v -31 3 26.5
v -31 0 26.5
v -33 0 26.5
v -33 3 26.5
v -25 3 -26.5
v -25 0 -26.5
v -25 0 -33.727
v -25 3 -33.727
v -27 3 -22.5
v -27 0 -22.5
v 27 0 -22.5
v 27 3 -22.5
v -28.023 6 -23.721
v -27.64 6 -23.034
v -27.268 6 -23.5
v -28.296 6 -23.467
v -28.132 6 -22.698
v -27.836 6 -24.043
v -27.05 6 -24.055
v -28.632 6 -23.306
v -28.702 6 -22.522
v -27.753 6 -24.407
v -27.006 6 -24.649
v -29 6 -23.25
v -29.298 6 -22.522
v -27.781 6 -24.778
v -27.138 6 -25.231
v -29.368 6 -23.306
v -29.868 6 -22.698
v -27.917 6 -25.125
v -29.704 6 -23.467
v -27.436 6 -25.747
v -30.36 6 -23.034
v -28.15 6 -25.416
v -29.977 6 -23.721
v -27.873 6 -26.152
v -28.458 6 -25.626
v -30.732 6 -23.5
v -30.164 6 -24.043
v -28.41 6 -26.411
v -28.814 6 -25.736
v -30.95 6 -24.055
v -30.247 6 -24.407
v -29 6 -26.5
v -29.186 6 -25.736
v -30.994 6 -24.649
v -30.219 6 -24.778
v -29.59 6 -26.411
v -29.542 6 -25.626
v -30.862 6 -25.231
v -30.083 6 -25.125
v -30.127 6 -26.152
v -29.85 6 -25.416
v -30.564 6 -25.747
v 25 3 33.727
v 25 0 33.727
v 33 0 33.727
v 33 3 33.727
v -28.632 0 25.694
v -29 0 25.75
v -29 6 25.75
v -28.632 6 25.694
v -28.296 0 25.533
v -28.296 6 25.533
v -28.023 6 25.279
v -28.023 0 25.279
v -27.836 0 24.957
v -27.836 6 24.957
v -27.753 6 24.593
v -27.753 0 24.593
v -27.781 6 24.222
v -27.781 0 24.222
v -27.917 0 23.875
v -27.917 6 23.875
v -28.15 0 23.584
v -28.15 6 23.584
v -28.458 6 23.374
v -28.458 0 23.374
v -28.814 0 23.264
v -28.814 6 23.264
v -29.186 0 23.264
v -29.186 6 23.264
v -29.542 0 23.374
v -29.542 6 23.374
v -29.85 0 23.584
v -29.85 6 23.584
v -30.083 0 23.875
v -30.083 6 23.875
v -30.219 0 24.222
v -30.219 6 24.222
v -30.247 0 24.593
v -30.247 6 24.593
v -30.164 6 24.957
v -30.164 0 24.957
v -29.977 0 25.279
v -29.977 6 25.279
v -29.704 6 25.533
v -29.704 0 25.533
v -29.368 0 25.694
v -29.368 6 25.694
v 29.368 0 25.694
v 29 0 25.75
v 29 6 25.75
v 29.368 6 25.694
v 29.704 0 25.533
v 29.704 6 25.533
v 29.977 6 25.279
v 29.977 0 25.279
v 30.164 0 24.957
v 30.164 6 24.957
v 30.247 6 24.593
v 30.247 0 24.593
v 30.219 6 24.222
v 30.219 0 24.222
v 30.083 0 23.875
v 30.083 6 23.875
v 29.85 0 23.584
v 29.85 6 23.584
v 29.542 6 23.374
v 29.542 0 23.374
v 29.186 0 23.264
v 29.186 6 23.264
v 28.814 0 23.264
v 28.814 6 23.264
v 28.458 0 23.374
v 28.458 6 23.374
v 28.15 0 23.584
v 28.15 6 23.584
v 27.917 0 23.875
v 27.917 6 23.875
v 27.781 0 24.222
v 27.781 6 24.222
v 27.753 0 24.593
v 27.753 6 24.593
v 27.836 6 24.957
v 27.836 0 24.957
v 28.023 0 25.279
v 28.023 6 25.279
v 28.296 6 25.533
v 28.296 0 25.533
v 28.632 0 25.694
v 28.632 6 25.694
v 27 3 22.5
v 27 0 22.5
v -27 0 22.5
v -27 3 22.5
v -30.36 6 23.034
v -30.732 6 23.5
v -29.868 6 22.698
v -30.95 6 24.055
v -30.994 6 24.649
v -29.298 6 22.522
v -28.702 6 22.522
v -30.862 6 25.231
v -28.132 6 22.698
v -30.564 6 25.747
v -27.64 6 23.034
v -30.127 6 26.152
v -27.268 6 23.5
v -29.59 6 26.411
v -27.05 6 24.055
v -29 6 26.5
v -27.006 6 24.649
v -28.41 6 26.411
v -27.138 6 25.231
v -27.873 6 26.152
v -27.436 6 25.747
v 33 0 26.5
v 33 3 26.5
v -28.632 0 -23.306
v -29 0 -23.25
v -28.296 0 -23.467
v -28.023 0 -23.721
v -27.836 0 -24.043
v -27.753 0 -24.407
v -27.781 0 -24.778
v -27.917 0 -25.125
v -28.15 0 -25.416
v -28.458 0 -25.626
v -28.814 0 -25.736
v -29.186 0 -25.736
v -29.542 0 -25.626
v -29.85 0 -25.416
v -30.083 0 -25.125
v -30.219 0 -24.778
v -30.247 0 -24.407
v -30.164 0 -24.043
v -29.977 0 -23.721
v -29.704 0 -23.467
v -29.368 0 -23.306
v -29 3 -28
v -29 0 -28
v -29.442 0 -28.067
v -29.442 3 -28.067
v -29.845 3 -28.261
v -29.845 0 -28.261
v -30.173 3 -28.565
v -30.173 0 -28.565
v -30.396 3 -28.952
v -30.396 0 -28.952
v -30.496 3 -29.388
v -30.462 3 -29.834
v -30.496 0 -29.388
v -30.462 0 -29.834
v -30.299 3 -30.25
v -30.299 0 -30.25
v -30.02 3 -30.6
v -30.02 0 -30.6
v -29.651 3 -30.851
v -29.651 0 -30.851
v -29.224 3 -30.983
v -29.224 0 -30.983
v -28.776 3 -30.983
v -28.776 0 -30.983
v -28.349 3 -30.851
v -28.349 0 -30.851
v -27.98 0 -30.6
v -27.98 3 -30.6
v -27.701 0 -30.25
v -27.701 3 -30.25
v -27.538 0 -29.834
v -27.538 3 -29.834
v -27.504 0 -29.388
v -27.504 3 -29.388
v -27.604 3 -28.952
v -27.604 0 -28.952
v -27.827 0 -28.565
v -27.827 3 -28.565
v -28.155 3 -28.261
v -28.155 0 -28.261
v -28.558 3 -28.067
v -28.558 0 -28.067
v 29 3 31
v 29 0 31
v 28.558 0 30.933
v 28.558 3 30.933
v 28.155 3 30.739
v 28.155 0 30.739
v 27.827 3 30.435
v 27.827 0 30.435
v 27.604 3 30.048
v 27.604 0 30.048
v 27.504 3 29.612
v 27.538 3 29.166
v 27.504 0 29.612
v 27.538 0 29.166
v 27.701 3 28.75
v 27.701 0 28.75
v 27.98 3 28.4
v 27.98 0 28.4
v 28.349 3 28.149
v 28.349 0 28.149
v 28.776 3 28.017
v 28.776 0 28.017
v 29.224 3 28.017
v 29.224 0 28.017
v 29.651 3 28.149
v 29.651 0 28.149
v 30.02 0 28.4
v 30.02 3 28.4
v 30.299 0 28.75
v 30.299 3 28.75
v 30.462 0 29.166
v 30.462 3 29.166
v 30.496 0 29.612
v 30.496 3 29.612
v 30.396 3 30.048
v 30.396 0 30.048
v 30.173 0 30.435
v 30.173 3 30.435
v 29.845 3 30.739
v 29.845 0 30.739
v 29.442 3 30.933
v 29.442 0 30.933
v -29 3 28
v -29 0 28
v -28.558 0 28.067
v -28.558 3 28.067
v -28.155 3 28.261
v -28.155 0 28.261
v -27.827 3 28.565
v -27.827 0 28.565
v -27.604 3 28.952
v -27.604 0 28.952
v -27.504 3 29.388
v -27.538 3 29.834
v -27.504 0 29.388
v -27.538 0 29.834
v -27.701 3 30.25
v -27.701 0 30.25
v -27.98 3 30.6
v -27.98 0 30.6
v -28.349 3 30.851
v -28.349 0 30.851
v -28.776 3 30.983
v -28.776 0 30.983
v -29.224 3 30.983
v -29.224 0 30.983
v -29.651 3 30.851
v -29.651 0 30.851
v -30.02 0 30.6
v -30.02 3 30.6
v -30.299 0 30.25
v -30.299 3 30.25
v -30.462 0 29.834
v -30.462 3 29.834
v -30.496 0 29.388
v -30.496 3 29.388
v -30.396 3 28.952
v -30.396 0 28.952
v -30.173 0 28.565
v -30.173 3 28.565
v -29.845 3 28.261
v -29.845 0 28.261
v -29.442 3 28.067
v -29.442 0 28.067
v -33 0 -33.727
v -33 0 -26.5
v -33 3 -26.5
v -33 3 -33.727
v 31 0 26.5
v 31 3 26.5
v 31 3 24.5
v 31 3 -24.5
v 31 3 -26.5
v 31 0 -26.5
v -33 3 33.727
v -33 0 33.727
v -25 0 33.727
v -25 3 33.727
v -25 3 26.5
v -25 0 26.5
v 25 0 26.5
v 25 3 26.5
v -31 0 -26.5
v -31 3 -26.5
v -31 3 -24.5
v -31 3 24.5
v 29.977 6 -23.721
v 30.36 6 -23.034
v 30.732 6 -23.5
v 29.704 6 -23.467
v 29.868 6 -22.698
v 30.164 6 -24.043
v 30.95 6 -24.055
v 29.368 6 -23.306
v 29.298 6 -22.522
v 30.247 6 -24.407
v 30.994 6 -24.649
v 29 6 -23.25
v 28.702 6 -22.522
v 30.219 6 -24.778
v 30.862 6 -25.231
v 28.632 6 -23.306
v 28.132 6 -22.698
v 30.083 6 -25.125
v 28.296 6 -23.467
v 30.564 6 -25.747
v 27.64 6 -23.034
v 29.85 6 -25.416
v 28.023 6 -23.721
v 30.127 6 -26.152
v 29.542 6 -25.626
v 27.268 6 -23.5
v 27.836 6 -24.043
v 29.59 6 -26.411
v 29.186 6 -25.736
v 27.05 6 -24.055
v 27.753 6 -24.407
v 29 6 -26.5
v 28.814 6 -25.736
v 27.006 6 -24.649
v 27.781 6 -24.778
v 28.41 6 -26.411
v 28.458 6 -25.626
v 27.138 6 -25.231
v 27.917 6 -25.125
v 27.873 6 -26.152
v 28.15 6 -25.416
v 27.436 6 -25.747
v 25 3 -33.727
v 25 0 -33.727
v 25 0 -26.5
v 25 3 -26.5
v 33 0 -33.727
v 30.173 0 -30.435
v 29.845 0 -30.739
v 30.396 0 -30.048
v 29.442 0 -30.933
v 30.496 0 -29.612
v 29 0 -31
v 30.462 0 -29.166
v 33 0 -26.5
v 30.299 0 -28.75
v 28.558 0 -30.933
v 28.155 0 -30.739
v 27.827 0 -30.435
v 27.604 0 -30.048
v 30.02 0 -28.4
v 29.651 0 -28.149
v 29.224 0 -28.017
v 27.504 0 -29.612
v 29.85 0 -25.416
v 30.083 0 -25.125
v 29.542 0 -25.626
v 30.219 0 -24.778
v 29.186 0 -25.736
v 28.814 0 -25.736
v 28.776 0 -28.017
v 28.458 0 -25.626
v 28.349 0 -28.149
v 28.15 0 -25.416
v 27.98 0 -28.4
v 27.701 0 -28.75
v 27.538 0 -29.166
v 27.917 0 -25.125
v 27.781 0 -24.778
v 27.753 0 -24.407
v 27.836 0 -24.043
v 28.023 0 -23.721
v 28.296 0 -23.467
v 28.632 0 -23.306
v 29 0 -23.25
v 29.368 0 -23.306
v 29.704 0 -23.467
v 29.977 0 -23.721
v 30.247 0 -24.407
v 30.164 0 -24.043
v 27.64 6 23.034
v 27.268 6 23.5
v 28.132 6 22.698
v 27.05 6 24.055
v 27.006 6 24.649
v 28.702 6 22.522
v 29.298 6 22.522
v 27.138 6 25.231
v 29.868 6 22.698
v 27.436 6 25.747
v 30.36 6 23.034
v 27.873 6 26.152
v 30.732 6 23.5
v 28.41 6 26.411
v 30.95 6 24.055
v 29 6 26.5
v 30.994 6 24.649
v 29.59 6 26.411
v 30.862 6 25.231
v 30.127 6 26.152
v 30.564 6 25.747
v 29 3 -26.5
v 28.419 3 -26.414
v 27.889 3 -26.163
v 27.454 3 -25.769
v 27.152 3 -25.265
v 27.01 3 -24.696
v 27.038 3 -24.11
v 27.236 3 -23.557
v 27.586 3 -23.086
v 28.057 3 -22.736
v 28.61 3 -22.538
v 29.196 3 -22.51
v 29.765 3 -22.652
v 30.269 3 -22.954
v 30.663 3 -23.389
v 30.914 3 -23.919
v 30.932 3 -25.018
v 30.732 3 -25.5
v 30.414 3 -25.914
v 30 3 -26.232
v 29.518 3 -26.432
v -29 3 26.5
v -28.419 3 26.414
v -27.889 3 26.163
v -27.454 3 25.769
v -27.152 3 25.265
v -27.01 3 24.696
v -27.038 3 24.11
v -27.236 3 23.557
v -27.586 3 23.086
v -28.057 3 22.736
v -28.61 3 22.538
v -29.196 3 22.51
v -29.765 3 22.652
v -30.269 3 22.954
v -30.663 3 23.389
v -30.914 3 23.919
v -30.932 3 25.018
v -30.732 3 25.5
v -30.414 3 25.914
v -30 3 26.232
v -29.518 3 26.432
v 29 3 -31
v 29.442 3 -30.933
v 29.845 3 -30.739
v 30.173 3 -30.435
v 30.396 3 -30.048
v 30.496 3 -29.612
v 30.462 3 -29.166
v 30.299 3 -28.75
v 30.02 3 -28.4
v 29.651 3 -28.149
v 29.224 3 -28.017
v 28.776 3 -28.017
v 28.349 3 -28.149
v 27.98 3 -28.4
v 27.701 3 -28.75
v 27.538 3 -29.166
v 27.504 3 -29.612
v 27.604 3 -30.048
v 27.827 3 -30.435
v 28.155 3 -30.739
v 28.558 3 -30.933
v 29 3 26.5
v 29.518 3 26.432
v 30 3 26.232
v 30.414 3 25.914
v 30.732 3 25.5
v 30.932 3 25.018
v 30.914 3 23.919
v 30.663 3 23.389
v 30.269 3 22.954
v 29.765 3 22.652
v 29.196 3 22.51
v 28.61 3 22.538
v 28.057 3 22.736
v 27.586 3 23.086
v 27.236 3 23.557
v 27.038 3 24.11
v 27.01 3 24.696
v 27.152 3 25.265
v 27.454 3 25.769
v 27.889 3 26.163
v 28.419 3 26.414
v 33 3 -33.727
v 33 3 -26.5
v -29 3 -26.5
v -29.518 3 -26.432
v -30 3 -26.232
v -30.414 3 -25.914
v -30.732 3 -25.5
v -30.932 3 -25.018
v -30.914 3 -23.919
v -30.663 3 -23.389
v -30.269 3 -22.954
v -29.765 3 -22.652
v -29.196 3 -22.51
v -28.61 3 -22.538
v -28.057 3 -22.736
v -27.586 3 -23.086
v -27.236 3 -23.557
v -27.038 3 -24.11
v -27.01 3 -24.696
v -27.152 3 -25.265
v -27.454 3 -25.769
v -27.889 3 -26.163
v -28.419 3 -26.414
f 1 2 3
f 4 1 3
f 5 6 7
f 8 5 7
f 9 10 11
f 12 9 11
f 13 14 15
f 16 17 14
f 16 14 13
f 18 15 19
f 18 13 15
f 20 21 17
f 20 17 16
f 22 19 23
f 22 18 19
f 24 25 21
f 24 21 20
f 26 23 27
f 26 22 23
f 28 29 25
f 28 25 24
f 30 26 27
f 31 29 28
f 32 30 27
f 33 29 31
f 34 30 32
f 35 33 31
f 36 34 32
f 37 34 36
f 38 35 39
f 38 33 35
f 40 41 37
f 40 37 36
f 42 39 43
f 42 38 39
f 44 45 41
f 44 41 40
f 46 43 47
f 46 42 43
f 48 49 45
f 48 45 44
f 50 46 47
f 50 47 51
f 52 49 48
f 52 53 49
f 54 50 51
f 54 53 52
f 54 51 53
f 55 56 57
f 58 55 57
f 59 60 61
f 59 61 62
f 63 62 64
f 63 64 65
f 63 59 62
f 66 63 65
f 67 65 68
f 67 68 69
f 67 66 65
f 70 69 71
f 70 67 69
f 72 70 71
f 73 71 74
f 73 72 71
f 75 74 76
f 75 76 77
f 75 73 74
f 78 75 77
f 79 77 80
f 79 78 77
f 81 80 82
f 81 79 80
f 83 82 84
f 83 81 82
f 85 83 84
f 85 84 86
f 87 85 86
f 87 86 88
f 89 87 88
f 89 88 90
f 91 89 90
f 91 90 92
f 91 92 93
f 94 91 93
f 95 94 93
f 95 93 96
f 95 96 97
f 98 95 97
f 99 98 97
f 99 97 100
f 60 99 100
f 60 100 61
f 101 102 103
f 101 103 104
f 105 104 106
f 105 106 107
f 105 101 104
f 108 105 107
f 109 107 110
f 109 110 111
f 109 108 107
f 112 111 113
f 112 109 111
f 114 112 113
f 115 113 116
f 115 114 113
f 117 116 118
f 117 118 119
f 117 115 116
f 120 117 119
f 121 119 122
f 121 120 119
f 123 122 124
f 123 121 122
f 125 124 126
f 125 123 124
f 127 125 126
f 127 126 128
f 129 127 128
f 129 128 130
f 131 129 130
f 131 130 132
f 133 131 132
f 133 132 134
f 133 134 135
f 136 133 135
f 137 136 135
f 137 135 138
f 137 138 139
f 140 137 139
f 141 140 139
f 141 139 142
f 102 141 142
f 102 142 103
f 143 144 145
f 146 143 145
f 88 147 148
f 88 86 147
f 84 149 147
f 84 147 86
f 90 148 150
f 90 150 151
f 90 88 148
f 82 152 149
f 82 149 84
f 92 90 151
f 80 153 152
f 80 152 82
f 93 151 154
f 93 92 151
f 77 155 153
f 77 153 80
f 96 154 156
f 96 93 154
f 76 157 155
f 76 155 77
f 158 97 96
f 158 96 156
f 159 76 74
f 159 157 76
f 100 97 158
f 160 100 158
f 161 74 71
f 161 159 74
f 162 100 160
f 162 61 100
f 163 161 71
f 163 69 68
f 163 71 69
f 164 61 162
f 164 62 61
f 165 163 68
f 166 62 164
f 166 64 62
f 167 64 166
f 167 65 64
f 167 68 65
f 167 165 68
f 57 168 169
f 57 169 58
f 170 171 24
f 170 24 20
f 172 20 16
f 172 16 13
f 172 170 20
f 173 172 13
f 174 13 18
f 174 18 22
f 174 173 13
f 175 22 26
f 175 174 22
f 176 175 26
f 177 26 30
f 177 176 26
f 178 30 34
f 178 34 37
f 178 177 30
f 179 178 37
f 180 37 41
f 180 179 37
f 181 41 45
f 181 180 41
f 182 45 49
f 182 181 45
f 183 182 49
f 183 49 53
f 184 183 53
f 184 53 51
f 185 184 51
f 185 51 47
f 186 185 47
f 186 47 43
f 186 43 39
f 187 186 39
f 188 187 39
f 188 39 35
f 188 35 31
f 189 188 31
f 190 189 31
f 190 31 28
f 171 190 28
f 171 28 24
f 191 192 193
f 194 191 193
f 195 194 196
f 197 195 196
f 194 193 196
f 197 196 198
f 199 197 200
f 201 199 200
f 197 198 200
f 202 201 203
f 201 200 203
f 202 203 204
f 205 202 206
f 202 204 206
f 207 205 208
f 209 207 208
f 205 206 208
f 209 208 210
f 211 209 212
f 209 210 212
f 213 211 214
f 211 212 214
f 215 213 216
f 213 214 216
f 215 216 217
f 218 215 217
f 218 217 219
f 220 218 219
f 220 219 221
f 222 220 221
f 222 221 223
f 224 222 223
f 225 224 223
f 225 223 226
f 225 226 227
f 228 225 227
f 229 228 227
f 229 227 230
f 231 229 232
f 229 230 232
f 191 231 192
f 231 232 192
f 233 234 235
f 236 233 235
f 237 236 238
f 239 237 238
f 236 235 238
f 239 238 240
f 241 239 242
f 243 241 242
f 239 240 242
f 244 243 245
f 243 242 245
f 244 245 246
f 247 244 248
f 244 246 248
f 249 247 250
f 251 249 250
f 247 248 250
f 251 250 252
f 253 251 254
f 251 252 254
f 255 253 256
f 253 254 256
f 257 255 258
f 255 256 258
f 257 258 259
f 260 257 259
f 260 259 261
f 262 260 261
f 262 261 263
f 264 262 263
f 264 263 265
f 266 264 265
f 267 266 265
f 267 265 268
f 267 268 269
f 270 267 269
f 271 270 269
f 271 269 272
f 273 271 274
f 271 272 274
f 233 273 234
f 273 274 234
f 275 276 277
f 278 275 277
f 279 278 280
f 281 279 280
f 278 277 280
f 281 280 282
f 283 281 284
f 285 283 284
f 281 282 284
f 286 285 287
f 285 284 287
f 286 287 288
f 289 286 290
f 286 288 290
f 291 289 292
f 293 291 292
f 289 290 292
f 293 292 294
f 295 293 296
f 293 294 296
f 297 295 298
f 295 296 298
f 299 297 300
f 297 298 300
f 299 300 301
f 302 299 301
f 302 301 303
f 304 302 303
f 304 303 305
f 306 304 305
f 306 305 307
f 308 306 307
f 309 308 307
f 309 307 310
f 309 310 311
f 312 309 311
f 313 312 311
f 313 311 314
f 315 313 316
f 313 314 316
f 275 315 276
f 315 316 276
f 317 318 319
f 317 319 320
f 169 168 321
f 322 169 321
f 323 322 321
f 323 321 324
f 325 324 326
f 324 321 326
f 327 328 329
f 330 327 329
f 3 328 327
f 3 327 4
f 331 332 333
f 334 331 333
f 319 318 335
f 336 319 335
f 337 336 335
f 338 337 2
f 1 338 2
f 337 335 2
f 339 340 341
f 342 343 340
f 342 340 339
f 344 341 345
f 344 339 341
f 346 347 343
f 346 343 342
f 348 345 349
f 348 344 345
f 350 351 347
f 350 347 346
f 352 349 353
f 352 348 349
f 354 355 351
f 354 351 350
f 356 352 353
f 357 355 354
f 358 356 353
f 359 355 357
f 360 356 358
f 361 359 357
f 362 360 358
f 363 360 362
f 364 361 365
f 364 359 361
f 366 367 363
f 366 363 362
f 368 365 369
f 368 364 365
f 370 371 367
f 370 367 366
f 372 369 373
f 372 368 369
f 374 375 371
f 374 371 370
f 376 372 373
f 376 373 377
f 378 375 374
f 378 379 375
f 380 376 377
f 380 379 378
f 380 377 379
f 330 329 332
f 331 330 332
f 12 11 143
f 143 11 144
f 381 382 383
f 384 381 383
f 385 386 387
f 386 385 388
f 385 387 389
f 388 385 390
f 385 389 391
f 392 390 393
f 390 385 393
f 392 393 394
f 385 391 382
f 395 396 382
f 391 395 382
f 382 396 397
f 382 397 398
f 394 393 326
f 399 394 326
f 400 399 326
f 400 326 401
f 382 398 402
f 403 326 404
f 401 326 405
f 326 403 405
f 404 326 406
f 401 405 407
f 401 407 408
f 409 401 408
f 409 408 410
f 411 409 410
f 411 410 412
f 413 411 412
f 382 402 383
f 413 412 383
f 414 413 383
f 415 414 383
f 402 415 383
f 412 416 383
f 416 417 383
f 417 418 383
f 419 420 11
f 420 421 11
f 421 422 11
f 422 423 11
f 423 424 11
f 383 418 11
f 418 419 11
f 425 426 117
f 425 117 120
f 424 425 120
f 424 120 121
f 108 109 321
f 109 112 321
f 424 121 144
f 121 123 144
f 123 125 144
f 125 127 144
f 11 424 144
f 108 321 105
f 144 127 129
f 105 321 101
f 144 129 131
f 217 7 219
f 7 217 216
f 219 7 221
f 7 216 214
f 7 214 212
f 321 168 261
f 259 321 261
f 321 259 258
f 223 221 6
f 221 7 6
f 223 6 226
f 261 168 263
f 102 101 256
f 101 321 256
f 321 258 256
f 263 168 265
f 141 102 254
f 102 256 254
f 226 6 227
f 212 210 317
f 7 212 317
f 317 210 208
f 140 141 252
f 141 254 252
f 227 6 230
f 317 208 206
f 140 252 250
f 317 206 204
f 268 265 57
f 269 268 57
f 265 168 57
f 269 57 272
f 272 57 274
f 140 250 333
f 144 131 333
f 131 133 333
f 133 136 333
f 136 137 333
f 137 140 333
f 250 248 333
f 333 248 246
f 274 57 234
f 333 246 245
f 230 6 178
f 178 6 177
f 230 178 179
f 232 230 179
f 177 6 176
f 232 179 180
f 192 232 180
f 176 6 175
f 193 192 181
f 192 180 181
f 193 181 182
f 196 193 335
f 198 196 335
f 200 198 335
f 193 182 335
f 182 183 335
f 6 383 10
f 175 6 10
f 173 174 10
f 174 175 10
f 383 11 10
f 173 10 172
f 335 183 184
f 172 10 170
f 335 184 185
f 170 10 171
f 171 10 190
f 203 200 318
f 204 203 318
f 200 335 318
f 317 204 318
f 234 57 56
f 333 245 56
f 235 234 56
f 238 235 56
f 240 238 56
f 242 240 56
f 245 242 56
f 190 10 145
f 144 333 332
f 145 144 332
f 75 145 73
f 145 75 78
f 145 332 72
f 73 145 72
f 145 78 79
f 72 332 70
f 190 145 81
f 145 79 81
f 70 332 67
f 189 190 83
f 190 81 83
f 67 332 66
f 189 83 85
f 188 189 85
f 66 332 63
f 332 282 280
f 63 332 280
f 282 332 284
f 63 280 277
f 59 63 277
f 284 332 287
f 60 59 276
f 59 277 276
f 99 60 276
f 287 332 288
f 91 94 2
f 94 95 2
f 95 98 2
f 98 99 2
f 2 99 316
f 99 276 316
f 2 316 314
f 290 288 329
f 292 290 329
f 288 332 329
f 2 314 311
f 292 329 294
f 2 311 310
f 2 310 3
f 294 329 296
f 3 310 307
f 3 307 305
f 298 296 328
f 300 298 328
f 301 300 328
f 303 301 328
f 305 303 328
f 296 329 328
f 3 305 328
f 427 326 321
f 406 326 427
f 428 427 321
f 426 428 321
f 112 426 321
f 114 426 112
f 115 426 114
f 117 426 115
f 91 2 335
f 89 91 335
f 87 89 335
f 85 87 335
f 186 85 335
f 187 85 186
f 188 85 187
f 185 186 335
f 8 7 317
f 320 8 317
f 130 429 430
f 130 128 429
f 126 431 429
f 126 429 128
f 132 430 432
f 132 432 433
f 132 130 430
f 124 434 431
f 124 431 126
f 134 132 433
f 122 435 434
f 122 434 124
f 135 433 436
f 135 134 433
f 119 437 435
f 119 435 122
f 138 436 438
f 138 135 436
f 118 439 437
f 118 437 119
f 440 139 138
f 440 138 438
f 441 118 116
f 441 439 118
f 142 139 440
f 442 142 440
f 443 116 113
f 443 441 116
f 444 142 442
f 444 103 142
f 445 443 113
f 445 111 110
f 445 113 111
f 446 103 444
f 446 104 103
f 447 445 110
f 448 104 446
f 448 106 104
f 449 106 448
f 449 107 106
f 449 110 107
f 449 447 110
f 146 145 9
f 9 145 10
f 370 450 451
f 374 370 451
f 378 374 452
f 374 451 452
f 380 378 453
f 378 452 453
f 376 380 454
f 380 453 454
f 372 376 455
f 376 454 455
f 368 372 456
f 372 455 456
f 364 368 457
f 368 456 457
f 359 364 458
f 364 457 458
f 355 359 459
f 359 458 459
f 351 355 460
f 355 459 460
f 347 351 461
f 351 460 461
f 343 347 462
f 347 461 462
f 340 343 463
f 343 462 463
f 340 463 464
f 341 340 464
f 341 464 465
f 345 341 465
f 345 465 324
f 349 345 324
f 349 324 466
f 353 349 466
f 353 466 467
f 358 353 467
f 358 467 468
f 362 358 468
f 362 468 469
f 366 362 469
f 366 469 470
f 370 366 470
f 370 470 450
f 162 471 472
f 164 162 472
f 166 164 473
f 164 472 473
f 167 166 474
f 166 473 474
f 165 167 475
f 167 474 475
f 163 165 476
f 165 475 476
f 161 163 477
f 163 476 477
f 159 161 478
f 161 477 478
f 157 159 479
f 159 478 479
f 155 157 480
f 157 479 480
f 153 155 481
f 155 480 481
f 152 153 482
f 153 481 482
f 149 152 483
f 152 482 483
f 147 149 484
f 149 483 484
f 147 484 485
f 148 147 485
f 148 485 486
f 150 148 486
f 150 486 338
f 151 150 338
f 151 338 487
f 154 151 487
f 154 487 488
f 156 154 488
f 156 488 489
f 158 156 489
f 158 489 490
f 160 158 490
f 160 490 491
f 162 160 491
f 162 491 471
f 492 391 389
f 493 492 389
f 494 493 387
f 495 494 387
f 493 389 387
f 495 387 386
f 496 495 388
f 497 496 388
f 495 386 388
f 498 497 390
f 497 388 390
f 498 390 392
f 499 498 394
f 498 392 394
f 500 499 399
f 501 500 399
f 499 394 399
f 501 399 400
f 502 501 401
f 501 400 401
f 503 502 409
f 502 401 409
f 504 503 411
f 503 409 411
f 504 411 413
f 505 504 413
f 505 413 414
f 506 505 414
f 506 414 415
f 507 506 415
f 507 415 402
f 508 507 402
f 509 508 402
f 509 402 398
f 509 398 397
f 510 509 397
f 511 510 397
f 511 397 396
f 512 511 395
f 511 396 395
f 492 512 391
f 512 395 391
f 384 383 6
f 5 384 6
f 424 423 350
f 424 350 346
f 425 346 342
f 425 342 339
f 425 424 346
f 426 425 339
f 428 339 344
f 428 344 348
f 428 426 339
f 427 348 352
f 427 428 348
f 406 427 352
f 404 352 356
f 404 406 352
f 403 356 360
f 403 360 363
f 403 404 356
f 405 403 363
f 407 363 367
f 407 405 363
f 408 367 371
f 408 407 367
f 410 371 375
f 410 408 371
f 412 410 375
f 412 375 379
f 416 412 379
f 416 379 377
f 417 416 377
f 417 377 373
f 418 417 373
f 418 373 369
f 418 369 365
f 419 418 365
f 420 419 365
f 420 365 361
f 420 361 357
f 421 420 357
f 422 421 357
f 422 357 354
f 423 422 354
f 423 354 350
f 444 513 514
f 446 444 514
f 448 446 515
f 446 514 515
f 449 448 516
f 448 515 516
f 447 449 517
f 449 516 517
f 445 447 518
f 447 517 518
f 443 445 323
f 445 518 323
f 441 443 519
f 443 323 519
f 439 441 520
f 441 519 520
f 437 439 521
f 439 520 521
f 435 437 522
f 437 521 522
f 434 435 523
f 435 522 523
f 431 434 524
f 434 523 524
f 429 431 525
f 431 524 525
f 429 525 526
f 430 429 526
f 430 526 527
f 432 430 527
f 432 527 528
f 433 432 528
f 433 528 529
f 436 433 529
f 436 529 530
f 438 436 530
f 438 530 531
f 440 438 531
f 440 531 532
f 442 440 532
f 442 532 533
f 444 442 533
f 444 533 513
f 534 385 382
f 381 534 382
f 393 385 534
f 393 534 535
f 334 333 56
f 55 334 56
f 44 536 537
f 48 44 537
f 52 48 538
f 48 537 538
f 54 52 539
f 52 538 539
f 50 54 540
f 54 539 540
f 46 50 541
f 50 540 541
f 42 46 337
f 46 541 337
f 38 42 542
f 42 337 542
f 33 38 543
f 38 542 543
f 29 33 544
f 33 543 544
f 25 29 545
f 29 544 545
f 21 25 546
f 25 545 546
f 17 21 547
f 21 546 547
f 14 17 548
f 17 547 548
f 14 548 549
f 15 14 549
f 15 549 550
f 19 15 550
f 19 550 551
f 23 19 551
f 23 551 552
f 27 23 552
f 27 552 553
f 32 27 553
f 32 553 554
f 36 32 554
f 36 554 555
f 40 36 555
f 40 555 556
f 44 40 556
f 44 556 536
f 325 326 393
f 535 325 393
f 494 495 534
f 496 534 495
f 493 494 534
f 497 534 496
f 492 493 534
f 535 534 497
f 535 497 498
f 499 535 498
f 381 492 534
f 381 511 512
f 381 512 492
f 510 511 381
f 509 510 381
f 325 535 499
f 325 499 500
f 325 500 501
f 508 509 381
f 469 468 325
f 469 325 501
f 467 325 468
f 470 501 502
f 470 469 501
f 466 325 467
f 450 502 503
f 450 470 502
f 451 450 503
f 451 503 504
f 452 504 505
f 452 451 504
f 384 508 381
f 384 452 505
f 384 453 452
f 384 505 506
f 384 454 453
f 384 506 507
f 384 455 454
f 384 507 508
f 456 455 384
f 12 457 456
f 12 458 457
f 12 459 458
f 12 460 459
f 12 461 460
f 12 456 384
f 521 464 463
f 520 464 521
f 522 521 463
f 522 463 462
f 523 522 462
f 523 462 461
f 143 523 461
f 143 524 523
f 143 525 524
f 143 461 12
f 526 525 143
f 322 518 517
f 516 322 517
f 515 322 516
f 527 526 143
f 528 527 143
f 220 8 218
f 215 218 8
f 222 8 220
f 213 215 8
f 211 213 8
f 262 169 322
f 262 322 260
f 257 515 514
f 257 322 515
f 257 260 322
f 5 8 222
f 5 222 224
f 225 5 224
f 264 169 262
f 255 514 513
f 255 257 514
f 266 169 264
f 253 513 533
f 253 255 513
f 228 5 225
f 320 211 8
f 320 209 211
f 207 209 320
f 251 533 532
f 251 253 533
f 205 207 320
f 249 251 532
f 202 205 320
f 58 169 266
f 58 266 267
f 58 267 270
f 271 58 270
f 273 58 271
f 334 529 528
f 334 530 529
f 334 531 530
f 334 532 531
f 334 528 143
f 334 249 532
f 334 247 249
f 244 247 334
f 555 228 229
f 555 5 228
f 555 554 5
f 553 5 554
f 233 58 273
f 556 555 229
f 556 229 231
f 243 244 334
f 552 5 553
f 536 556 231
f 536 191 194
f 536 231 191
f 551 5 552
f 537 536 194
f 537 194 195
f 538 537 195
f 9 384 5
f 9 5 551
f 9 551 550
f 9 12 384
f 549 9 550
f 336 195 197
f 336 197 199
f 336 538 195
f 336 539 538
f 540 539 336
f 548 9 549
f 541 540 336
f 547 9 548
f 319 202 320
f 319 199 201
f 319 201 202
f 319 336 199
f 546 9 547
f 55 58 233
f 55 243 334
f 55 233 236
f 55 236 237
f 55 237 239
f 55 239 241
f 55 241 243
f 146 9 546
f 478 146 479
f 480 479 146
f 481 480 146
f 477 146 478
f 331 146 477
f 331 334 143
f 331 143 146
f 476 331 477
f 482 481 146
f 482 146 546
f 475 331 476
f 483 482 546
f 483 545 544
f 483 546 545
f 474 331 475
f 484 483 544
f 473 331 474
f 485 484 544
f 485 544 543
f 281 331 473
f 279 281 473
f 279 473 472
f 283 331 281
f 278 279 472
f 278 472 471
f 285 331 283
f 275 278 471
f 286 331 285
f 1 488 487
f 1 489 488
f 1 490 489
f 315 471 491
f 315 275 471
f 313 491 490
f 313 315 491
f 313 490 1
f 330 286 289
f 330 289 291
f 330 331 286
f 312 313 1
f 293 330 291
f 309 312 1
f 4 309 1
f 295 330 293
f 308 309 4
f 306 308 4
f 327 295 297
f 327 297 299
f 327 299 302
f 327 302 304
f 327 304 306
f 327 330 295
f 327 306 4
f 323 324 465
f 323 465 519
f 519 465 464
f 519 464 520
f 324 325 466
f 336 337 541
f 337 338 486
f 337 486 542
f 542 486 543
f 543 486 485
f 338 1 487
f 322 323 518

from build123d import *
from build123d.topology import SkipClean

# Parameters (mm, degrees)
SKETCH_1_R      = 2
SKETCH_1_R_2    = 1.25
EXTRUDE_1_DEPTH = 3
SKETCH_2_R      = 2
SKETCH_2_R_2    = 1.25
EXTRUDE_2_DEPTH = 3
SKETCH_3_R      = 1.5
EXTRUDE_3_DEPTH = 3
EXTRUDE_4_DEPTH = 3


with BuildPart() as part:
    # 草图1 → 凸台-拉伸1 (new body)
    # profile 1 of 12: a face of its own
    with BuildSketch(Plane(origin=(0, 0, 0), x_dir=(1, 0, 0), z_dir=(0, 1, 0))):
        with BuildLine():
            ThreePointArc((-27, -24.5), (-27.585786438, -25.914213562), (-29, -26.5))
            Line((-29, -26.5), (29, -26.5))
            ThreePointArc((29, -26.5), (27.585786438, -25.914213562), (27, -24.5))
            Line((27, -24.5), (27, -22.5))
            Line((27, -22.5), (-27, -22.5))
            Line((-27, -22.5), (-27, -24.5))
        make_face()
    # profile 2 of 12: a face of its own
    with BuildSketch(Plane(origin=(0, 0, 0), x_dir=(1, 0, 0), z_dir=(0, 1, 0))):
        with BuildLine():
            Line((29, -22.5), (27, -22.5))
            Line((27, -22.5), (27, -24.5))
            ThreePointArc((27, -24.5), (27.585786438, -23.085786438), (29, -22.5))
        make_face()
    # profile 3 of 12: a face of its own
    with BuildSketch(Plane(origin=(0, 0, 0), x_dir=(1, 0, 0), z_dir=(0, 1, 0))):
        with Locations((29, -24.5)):
            Circle(SKETCH_1_R)
        with Locations(Location((29, -24.5, 0), (0, 0, 270))):
            Circle(SKETCH_1_R_2, mode=Mode.SUBTRACT)
    # profile 4 of 12: a face of its own
    with BuildSketch(Plane(origin=(0, 0, 0), x_dir=(1, 0, 0), z_dir=(0, 1, 0))):
        with BuildLine():
            Line((31, -24.5), (31, 24.5))
            ThreePointArc((31, 24.5), (30.414213562, 23.085786438), (29, 22.5))
            Line((29, 22.5), (27, 22.5))
            Line((27, 22.5), (27, -22.5))
            Line((27, -22.5), (29, -22.5))
            ThreePointArc((29, -22.5), (30.414213562, -23.085786438), (31, -24.5))
        make_face()
    # profile 5 of 12: a face of its own
    with BuildSketch(Plane(origin=(0, 0, 0), x_dir=(1, 0, 0), z_dir=(0, 1, 0))):
        with BuildLine():
            ThreePointArc((-29, 22.5), (-30.414213562, 23.085786438), (-31, 24.5))
            Line((-31, 24.5), (-31, -24.5))
            ThreePointArc((-31, -24.5), (-30.414213562, -23.085786438), (-29, -22.5))
            Line((-29, -22.5), (-27, -22.5))
            Line((-27, -22.5), (-27, 22.5))
            Line((-27, 22.5), (-29, 22.5))
        make_face()
    # profile 6 of 12: a face of its own
    with BuildSketch(Plane(origin=(0, 0, 0), x_dir=(1, 0, 0), z_dir=(0, 1, 0))):
        with Locations((-29, -24.5)):
            Circle(SKETCH_1_R)
        with Locations(Location((-29, -24.5, 0), (0, 0, 270))):
            Circle(SKETCH_1_R_2, mode=Mode.SUBTRACT)
    # profile 7 of 12: a face of its own
    with BuildSketch(Plane(origin=(0, 0, 0), x_dir=(1, 0, 0), z_dir=(0, 1, 0))):
        with BuildLine():
            Line((-27, -22.5), (-29, -22.5))
            ThreePointArc((-29, -22.5), (-27.585786438, -23.085786438), (-27, -24.5))
            Line((-27, -24.5), (-27, -22.5))
        make_face()
    # profile 8 of 12: a face of its own
    with BuildSketch(Plane(origin=(0, 0, 0), x_dir=(1, 0, 0), z_dir=(0, 1, 0))):
        with BuildLine():
            ThreePointArc((29, 22.5), (27.585786438, 23.085786438), (27, 24.5))
            Line((27, 24.5), (27, 22.5))
            Line((27, 22.5), (29, 22.5))
        make_face()
    # profile 9 of 12: a face of its own
    with BuildSketch(Plane(origin=(0, 0, 0), x_dir=(1, 0, 0), z_dir=(0, 1, 0))):
        with Locations((29, 24.5)):
            Circle(SKETCH_1_R)
        with Locations(Location((29, 24.5, 0), (0, 0, 270))):
            Circle(SKETCH_1_R_2, mode=Mode.SUBTRACT)
    # profile 10 of 12: a face of its own
    with BuildSketch(Plane(origin=(0, 0, 0), x_dir=(1, 0, 0), z_dir=(0, 1, 0))):
        with BuildLine():
            Line((29, 26.5), (-29, 26.5))
            ThreePointArc((-29, 26.5), (-27.585786438, 25.914213562), (-27, 24.5))
            Line((-27, 24.5), (-27, 22.5))
            Line((-27, 22.5), (27, 22.5))
            Line((27, 22.5), (27, 24.5))
            ThreePointArc((27, 24.5), (27.585786438, 25.914213562), (29, 26.5))
        make_face()
    # profile 11 of 12: a face of its own
    with BuildSketch(Plane(origin=(0, 0, 0), x_dir=(1, 0, 0), z_dir=(0, 1, 0))):
        with BuildLine():
            ThreePointArc((-27, 24.5), (-27.585786438, 23.085786438), (-29, 22.5))
            Line((-29, 22.5), (-27, 22.5))
            Line((-27, 22.5), (-27, 24.5))
        make_face()
    # profile 12 of 12: a face of its own
    with BuildSketch(Plane(origin=(0, 0, 0), x_dir=(1, 0, 0), z_dir=(0, 1, 0))):
        with Locations((-29, 24.5)):
            Circle(SKETCH_1_R)
        with Locations(Location((-29, 24.5, 0), (0, 0, 270))):
            Circle(SKETCH_1_R_2, mode=Mode.SUBTRACT)
    extrude(amount=EXTRUDE_1_DEPTH)

    # 草图2 → 凸台-拉伸2 (add)
    # profile 1 of 4: a face of its own
    with SkipClean():  # the faces are left unmerged after this step: merging them gives an invalid solid
        with BuildSketch(Plane(origin=(0, 3, 0), x_dir=(1, 0, 0), z_dir=(0, 1, 0))):
            with Locations(Location((-29, 24.5, 0), (0, 0, 90))):
                Circle(SKETCH_2_R)
            with Locations(Location((-29, 24.5, 0), (0, 0, 270))):
                Circle(SKETCH_2_R_2, mode=Mode.SUBTRACT)
        # profile 2 of 4: a face of its own
        with BuildSketch(Plane(origin=(0, 3, 0), x_dir=(1, 0, 0), z_dir=(0, 1, 0))):
            with Locations(Location((29, 24.5, 0), (0, 0, 90))):
                Circle(SKETCH_2_R)
            with Locations(Location((29, 24.5, 0), (0, 0, 270))):
                Circle(SKETCH_2_R_2, mode=Mode.SUBTRACT)
        # profile 3 of 4: a face of its own
        with BuildSketch(Plane(origin=(0, 3, 0), x_dir=(1, 0, 0), z_dir=(0, 1, 0))):
            with Locations(Location((-29, -24.5, 0), (0, 0, 270))):
                Circle(SKETCH_2_R)
            with Locations(Location((-29, -24.5, 0), (0, 0, 270))):
                Circle(SKETCH_2_R_2, mode=Mode.SUBTRACT)
        # profile 4 of 4: a face of its own
        with BuildSketch(Plane(origin=(0, 3, 0), x_dir=(1, 0, 0), z_dir=(0, 1, 0))):
            with Locations(Location((29, -24.5, 0), (0, 0, 270))):
                Circle(SKETCH_2_R)
            with Locations(Location((29, -24.5, 0), (0, 0, 270))):
                Circle(SKETCH_2_R_2, mode=Mode.SUBTRACT)
        extrude(amount=EXTRUDE_2_DEPTH)

    # 草图3 → 凸台-拉伸3 (add)
    # profile 1 of 4: a face of its own
    with BuildSketch(Plane.XZ):
        with BuildLine():
            Line((-31, 24.5), (-31, 31.727166486))
            Line((-31, 31.727166486), (-27, 31.727166486))
            Line((-27, 31.727166486), (-27, 26.5))
            Line((-27, 26.5), (-29, 26.5))
            ThreePointArc((-29, 26.5), (-30.414213562, 25.914213562), (-31, 24.5))
        make_face()
        with Locations(Location((-29, 29.5, 0), (0, 0, 270))):
            Circle(SKETCH_3_R, mode=Mode.SUBTRACT)
    # profile 2 of 4: a face of its own
    with BuildSketch(Plane.XZ):
        with BuildLine():
            Line((29, 26.5), (27, 26.5))
            Line((27, 26.5), (27, 31.727166486))
            Line((27, 31.727166486), (31, 31.727166486))
            Line((31, 31.727166486), (31, 24.5))
            ThreePointArc((31, 24.5), (30.414213562, 25.914213562), (29, 26.5))
        make_face()
        with Locations(Location((29, 29.5, 0), (0, 0, 90))):
            Circle(SKETCH_3_R, mode=Mode.SUBTRACT)
    # profile 3 of 4: a face of its own
    with BuildSketch(Plane.XZ):
        with BuildLine():
            Line((31, -24.5), (31, -31.727166486))
            Line((31, -31.727166486), (27, -31.727166486))
            Line((27, -31.727166486), (27, -26.5))
            Line((27, -26.5), (29, -26.5))
            ThreePointArc((29, -26.5), (30.414213562, -25.914213562), (31, -24.5))
        make_face()
        with Locations(Location((29, -29.5, 0), (0, 0, 270))):
            Circle(SKETCH_3_R, mode=Mode.SUBTRACT)
    # profile 4 of 4: a face of its own
    with BuildSketch(Plane.XZ):
        with BuildLine():
            Line((-29, -26.5), (-27, -26.5))
            Line((-27, -26.5), (-27, -31.727166486))
            Line((-27, -31.727166486), (-31, -31.727166486))
            Line((-31, -31.727166486), (-31, -24.5))
            ThreePointArc((-31, -24.5), (-30.414213562, -25.914213562), (-29, -26.5))
        make_face()
        with Locations(Location((-29, -29.5, 0), (0, 0, 90))):
            Circle(SKETCH_3_R, mode=Mode.SUBTRACT)
    extrude(amount=-EXTRUDE_3_DEPTH)

    # 草图4 → 凸台-拉伸4 (add)
    with BuildSketch(Plane.XZ):
        Polygon((-31, 26.5), (-33, 26.5), (-33, 31.727166486), (-33, 33.727166486), (-25, 33.727166486), (-25, 26.5), (-27, 26.5), (-27, 31.727166486), (-31, 31.727166486), align=None)
        Polygon((27, 31.727166486), (27, 26.5), (25, 26.5), (25, 33.727166486), (33, 33.727166486), (33, 31.727166486), (33, 26.5), (31, 26.5), (31, 31.727166486), align=None)
        Polygon((31, -26.5), (33, -26.5), (33, -31.727166486), (33, -33.727166486), (25, -33.727166486), (25, -26.5), (27, -26.5), (27, -31.727166486), (31, -31.727166486), align=None)
        Polygon((-27, -31.727166486), (-27, -26.5), (-25, -26.5), (-25, -33.727166486), (-33, -33.727166486), (-33, -31.727166486), (-33, -26.5), (-31, -26.5), (-31, -31.727166486), align=None)
    extrude(amount=-EXTRUDE_4_DEPTH)


solid = part.part
